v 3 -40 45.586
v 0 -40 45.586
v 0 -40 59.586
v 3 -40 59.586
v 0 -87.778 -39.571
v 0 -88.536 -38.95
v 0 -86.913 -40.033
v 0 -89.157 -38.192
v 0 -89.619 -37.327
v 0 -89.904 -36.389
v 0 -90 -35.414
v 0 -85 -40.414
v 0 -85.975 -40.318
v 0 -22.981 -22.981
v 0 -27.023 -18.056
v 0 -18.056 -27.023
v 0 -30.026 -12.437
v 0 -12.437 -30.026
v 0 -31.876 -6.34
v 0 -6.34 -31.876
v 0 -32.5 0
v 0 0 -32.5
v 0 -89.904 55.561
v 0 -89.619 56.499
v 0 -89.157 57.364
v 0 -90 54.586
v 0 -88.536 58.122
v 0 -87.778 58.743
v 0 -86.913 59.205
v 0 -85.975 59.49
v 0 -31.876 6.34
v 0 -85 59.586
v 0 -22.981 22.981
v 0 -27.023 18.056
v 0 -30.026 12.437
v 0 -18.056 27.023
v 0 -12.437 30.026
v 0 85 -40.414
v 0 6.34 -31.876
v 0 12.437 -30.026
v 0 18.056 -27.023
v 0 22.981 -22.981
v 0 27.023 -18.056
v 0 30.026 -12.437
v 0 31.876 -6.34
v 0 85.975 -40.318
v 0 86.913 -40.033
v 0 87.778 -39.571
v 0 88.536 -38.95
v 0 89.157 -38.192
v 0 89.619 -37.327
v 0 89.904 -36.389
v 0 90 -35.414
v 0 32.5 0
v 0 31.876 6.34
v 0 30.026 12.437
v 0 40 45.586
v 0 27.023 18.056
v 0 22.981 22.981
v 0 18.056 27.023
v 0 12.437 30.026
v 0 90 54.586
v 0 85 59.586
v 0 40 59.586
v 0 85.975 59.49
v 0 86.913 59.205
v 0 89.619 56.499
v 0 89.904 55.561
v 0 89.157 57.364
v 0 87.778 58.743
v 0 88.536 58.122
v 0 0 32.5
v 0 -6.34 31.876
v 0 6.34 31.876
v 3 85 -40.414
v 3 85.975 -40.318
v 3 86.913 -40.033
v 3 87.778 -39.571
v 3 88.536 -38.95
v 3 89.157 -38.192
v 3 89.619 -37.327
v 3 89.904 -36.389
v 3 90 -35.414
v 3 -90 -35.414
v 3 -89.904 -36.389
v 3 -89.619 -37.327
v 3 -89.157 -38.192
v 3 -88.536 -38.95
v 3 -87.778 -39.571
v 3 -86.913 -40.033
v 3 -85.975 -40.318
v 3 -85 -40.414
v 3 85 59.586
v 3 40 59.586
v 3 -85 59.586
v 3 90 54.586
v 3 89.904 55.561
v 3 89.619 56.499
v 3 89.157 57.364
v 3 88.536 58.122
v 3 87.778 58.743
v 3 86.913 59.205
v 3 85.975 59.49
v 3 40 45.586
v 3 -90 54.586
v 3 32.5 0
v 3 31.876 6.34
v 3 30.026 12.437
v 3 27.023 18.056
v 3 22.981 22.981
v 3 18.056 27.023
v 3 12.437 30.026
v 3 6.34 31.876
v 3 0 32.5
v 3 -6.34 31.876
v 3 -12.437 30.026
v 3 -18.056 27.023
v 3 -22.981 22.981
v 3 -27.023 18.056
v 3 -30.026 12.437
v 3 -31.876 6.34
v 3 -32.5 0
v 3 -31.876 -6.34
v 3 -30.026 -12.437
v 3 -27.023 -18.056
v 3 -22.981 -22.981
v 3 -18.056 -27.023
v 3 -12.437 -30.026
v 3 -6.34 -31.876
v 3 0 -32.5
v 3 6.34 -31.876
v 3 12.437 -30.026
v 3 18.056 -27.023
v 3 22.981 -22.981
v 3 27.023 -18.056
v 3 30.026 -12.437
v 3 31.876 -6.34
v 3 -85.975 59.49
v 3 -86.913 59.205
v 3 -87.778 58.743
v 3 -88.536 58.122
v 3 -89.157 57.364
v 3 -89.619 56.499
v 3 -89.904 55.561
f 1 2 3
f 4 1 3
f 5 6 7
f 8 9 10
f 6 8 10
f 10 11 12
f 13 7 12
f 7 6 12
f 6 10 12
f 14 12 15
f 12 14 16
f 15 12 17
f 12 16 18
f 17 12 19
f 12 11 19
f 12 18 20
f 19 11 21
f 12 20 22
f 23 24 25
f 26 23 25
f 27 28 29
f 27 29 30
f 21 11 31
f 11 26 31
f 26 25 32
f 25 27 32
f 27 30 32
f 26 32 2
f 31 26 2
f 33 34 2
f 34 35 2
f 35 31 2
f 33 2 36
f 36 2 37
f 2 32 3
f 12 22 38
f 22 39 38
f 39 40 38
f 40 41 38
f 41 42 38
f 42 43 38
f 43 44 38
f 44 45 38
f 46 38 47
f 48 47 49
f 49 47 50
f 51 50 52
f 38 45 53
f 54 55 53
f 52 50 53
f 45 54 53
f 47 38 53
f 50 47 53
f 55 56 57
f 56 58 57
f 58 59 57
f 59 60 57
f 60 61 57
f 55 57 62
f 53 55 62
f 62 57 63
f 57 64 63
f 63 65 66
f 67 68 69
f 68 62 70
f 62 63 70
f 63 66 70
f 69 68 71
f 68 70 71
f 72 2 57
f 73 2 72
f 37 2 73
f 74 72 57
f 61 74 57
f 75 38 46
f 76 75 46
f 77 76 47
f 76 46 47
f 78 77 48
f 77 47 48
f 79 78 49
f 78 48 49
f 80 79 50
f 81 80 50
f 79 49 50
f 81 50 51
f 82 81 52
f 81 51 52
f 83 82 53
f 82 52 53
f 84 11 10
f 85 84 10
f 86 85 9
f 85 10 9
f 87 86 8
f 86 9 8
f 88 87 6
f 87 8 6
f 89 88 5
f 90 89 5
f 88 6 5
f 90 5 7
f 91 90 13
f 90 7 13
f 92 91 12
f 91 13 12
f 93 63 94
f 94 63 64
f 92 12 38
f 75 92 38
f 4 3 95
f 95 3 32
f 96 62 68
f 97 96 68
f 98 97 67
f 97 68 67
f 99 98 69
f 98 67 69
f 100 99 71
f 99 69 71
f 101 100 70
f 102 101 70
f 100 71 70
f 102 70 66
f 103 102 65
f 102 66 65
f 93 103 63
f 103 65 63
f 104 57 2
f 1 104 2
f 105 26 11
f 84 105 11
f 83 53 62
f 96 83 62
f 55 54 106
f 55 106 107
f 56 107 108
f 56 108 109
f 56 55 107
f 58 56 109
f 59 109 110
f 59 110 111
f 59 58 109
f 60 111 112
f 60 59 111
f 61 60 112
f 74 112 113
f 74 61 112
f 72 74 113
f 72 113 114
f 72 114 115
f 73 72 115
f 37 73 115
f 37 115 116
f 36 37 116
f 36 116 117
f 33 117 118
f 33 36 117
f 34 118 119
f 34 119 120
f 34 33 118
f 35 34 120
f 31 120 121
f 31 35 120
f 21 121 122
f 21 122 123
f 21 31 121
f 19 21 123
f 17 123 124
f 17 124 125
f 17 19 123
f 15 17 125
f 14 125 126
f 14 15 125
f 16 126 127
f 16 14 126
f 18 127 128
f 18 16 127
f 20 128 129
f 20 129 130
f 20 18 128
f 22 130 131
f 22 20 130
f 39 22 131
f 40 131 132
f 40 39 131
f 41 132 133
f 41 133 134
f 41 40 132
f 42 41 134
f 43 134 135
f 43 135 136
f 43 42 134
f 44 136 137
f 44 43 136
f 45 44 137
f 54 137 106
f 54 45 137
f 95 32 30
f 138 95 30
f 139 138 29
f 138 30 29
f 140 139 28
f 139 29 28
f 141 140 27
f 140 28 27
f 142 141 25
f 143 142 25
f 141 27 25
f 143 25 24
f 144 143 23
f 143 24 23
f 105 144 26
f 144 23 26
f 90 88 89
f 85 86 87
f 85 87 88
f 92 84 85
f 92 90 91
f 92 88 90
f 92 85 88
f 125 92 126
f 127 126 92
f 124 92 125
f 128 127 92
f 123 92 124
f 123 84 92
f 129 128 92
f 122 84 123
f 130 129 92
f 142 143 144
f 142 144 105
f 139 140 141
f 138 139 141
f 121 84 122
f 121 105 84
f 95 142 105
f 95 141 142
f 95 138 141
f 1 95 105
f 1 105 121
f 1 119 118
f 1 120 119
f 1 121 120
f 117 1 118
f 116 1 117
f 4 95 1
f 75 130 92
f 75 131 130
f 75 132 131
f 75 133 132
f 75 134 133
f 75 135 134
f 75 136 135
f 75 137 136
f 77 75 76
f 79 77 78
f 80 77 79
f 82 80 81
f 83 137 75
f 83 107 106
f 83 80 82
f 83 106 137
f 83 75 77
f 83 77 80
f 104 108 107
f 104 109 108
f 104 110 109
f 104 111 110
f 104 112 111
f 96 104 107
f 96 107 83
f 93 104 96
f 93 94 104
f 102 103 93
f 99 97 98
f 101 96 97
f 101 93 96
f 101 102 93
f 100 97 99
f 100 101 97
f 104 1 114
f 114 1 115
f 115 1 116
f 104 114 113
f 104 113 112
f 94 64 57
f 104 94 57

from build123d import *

# Parameters (mm, degrees)
F0_R     = 32.5
F1_DEPTH = 3


with BuildPart() as f1:
    # F0 (on Right) → F1 (new body)
    with BuildSketch(Plane.YZ):
        with BuildLine():
            ThreePointArc((90, 54.586), (88.535534, 58.121534), (85, 59.586))
            Line((85, 59.586), (40, 59.586))
            Line((40, 59.586), (40, 54.586))
            Line((40, 54.586), (40, 45.586))
            Line((40, 45.586), (-40, 45.586))
            Line((-40, 45.586), (-40, 54.586))
            Line((-40, 54.586), (-40, 59.586))
            Line((-40, 59.586), (-85, 59.586))
            ThreePointArc((-85, 59.586), (-88.535534, 58.121534), (-90, 54.586))
            Line((-90, 54.586), (-90, -35.414))
            ThreePointArc((-90, -35.414), (-88.535534, -38.949534), (-85, -40.414))
            Line((-85, -40.414), (85, -40.414))
            ThreePointArc((85, -40.414), (88.535534, -38.949534), (90, -35.414))
            Line((90, -35.414), (90, 54.586))
        make_face()
        Circle(F0_R, mode=Mode.SUBTRACT)
    extrude(amount=F1_DEPTH)


solid = f1.part
